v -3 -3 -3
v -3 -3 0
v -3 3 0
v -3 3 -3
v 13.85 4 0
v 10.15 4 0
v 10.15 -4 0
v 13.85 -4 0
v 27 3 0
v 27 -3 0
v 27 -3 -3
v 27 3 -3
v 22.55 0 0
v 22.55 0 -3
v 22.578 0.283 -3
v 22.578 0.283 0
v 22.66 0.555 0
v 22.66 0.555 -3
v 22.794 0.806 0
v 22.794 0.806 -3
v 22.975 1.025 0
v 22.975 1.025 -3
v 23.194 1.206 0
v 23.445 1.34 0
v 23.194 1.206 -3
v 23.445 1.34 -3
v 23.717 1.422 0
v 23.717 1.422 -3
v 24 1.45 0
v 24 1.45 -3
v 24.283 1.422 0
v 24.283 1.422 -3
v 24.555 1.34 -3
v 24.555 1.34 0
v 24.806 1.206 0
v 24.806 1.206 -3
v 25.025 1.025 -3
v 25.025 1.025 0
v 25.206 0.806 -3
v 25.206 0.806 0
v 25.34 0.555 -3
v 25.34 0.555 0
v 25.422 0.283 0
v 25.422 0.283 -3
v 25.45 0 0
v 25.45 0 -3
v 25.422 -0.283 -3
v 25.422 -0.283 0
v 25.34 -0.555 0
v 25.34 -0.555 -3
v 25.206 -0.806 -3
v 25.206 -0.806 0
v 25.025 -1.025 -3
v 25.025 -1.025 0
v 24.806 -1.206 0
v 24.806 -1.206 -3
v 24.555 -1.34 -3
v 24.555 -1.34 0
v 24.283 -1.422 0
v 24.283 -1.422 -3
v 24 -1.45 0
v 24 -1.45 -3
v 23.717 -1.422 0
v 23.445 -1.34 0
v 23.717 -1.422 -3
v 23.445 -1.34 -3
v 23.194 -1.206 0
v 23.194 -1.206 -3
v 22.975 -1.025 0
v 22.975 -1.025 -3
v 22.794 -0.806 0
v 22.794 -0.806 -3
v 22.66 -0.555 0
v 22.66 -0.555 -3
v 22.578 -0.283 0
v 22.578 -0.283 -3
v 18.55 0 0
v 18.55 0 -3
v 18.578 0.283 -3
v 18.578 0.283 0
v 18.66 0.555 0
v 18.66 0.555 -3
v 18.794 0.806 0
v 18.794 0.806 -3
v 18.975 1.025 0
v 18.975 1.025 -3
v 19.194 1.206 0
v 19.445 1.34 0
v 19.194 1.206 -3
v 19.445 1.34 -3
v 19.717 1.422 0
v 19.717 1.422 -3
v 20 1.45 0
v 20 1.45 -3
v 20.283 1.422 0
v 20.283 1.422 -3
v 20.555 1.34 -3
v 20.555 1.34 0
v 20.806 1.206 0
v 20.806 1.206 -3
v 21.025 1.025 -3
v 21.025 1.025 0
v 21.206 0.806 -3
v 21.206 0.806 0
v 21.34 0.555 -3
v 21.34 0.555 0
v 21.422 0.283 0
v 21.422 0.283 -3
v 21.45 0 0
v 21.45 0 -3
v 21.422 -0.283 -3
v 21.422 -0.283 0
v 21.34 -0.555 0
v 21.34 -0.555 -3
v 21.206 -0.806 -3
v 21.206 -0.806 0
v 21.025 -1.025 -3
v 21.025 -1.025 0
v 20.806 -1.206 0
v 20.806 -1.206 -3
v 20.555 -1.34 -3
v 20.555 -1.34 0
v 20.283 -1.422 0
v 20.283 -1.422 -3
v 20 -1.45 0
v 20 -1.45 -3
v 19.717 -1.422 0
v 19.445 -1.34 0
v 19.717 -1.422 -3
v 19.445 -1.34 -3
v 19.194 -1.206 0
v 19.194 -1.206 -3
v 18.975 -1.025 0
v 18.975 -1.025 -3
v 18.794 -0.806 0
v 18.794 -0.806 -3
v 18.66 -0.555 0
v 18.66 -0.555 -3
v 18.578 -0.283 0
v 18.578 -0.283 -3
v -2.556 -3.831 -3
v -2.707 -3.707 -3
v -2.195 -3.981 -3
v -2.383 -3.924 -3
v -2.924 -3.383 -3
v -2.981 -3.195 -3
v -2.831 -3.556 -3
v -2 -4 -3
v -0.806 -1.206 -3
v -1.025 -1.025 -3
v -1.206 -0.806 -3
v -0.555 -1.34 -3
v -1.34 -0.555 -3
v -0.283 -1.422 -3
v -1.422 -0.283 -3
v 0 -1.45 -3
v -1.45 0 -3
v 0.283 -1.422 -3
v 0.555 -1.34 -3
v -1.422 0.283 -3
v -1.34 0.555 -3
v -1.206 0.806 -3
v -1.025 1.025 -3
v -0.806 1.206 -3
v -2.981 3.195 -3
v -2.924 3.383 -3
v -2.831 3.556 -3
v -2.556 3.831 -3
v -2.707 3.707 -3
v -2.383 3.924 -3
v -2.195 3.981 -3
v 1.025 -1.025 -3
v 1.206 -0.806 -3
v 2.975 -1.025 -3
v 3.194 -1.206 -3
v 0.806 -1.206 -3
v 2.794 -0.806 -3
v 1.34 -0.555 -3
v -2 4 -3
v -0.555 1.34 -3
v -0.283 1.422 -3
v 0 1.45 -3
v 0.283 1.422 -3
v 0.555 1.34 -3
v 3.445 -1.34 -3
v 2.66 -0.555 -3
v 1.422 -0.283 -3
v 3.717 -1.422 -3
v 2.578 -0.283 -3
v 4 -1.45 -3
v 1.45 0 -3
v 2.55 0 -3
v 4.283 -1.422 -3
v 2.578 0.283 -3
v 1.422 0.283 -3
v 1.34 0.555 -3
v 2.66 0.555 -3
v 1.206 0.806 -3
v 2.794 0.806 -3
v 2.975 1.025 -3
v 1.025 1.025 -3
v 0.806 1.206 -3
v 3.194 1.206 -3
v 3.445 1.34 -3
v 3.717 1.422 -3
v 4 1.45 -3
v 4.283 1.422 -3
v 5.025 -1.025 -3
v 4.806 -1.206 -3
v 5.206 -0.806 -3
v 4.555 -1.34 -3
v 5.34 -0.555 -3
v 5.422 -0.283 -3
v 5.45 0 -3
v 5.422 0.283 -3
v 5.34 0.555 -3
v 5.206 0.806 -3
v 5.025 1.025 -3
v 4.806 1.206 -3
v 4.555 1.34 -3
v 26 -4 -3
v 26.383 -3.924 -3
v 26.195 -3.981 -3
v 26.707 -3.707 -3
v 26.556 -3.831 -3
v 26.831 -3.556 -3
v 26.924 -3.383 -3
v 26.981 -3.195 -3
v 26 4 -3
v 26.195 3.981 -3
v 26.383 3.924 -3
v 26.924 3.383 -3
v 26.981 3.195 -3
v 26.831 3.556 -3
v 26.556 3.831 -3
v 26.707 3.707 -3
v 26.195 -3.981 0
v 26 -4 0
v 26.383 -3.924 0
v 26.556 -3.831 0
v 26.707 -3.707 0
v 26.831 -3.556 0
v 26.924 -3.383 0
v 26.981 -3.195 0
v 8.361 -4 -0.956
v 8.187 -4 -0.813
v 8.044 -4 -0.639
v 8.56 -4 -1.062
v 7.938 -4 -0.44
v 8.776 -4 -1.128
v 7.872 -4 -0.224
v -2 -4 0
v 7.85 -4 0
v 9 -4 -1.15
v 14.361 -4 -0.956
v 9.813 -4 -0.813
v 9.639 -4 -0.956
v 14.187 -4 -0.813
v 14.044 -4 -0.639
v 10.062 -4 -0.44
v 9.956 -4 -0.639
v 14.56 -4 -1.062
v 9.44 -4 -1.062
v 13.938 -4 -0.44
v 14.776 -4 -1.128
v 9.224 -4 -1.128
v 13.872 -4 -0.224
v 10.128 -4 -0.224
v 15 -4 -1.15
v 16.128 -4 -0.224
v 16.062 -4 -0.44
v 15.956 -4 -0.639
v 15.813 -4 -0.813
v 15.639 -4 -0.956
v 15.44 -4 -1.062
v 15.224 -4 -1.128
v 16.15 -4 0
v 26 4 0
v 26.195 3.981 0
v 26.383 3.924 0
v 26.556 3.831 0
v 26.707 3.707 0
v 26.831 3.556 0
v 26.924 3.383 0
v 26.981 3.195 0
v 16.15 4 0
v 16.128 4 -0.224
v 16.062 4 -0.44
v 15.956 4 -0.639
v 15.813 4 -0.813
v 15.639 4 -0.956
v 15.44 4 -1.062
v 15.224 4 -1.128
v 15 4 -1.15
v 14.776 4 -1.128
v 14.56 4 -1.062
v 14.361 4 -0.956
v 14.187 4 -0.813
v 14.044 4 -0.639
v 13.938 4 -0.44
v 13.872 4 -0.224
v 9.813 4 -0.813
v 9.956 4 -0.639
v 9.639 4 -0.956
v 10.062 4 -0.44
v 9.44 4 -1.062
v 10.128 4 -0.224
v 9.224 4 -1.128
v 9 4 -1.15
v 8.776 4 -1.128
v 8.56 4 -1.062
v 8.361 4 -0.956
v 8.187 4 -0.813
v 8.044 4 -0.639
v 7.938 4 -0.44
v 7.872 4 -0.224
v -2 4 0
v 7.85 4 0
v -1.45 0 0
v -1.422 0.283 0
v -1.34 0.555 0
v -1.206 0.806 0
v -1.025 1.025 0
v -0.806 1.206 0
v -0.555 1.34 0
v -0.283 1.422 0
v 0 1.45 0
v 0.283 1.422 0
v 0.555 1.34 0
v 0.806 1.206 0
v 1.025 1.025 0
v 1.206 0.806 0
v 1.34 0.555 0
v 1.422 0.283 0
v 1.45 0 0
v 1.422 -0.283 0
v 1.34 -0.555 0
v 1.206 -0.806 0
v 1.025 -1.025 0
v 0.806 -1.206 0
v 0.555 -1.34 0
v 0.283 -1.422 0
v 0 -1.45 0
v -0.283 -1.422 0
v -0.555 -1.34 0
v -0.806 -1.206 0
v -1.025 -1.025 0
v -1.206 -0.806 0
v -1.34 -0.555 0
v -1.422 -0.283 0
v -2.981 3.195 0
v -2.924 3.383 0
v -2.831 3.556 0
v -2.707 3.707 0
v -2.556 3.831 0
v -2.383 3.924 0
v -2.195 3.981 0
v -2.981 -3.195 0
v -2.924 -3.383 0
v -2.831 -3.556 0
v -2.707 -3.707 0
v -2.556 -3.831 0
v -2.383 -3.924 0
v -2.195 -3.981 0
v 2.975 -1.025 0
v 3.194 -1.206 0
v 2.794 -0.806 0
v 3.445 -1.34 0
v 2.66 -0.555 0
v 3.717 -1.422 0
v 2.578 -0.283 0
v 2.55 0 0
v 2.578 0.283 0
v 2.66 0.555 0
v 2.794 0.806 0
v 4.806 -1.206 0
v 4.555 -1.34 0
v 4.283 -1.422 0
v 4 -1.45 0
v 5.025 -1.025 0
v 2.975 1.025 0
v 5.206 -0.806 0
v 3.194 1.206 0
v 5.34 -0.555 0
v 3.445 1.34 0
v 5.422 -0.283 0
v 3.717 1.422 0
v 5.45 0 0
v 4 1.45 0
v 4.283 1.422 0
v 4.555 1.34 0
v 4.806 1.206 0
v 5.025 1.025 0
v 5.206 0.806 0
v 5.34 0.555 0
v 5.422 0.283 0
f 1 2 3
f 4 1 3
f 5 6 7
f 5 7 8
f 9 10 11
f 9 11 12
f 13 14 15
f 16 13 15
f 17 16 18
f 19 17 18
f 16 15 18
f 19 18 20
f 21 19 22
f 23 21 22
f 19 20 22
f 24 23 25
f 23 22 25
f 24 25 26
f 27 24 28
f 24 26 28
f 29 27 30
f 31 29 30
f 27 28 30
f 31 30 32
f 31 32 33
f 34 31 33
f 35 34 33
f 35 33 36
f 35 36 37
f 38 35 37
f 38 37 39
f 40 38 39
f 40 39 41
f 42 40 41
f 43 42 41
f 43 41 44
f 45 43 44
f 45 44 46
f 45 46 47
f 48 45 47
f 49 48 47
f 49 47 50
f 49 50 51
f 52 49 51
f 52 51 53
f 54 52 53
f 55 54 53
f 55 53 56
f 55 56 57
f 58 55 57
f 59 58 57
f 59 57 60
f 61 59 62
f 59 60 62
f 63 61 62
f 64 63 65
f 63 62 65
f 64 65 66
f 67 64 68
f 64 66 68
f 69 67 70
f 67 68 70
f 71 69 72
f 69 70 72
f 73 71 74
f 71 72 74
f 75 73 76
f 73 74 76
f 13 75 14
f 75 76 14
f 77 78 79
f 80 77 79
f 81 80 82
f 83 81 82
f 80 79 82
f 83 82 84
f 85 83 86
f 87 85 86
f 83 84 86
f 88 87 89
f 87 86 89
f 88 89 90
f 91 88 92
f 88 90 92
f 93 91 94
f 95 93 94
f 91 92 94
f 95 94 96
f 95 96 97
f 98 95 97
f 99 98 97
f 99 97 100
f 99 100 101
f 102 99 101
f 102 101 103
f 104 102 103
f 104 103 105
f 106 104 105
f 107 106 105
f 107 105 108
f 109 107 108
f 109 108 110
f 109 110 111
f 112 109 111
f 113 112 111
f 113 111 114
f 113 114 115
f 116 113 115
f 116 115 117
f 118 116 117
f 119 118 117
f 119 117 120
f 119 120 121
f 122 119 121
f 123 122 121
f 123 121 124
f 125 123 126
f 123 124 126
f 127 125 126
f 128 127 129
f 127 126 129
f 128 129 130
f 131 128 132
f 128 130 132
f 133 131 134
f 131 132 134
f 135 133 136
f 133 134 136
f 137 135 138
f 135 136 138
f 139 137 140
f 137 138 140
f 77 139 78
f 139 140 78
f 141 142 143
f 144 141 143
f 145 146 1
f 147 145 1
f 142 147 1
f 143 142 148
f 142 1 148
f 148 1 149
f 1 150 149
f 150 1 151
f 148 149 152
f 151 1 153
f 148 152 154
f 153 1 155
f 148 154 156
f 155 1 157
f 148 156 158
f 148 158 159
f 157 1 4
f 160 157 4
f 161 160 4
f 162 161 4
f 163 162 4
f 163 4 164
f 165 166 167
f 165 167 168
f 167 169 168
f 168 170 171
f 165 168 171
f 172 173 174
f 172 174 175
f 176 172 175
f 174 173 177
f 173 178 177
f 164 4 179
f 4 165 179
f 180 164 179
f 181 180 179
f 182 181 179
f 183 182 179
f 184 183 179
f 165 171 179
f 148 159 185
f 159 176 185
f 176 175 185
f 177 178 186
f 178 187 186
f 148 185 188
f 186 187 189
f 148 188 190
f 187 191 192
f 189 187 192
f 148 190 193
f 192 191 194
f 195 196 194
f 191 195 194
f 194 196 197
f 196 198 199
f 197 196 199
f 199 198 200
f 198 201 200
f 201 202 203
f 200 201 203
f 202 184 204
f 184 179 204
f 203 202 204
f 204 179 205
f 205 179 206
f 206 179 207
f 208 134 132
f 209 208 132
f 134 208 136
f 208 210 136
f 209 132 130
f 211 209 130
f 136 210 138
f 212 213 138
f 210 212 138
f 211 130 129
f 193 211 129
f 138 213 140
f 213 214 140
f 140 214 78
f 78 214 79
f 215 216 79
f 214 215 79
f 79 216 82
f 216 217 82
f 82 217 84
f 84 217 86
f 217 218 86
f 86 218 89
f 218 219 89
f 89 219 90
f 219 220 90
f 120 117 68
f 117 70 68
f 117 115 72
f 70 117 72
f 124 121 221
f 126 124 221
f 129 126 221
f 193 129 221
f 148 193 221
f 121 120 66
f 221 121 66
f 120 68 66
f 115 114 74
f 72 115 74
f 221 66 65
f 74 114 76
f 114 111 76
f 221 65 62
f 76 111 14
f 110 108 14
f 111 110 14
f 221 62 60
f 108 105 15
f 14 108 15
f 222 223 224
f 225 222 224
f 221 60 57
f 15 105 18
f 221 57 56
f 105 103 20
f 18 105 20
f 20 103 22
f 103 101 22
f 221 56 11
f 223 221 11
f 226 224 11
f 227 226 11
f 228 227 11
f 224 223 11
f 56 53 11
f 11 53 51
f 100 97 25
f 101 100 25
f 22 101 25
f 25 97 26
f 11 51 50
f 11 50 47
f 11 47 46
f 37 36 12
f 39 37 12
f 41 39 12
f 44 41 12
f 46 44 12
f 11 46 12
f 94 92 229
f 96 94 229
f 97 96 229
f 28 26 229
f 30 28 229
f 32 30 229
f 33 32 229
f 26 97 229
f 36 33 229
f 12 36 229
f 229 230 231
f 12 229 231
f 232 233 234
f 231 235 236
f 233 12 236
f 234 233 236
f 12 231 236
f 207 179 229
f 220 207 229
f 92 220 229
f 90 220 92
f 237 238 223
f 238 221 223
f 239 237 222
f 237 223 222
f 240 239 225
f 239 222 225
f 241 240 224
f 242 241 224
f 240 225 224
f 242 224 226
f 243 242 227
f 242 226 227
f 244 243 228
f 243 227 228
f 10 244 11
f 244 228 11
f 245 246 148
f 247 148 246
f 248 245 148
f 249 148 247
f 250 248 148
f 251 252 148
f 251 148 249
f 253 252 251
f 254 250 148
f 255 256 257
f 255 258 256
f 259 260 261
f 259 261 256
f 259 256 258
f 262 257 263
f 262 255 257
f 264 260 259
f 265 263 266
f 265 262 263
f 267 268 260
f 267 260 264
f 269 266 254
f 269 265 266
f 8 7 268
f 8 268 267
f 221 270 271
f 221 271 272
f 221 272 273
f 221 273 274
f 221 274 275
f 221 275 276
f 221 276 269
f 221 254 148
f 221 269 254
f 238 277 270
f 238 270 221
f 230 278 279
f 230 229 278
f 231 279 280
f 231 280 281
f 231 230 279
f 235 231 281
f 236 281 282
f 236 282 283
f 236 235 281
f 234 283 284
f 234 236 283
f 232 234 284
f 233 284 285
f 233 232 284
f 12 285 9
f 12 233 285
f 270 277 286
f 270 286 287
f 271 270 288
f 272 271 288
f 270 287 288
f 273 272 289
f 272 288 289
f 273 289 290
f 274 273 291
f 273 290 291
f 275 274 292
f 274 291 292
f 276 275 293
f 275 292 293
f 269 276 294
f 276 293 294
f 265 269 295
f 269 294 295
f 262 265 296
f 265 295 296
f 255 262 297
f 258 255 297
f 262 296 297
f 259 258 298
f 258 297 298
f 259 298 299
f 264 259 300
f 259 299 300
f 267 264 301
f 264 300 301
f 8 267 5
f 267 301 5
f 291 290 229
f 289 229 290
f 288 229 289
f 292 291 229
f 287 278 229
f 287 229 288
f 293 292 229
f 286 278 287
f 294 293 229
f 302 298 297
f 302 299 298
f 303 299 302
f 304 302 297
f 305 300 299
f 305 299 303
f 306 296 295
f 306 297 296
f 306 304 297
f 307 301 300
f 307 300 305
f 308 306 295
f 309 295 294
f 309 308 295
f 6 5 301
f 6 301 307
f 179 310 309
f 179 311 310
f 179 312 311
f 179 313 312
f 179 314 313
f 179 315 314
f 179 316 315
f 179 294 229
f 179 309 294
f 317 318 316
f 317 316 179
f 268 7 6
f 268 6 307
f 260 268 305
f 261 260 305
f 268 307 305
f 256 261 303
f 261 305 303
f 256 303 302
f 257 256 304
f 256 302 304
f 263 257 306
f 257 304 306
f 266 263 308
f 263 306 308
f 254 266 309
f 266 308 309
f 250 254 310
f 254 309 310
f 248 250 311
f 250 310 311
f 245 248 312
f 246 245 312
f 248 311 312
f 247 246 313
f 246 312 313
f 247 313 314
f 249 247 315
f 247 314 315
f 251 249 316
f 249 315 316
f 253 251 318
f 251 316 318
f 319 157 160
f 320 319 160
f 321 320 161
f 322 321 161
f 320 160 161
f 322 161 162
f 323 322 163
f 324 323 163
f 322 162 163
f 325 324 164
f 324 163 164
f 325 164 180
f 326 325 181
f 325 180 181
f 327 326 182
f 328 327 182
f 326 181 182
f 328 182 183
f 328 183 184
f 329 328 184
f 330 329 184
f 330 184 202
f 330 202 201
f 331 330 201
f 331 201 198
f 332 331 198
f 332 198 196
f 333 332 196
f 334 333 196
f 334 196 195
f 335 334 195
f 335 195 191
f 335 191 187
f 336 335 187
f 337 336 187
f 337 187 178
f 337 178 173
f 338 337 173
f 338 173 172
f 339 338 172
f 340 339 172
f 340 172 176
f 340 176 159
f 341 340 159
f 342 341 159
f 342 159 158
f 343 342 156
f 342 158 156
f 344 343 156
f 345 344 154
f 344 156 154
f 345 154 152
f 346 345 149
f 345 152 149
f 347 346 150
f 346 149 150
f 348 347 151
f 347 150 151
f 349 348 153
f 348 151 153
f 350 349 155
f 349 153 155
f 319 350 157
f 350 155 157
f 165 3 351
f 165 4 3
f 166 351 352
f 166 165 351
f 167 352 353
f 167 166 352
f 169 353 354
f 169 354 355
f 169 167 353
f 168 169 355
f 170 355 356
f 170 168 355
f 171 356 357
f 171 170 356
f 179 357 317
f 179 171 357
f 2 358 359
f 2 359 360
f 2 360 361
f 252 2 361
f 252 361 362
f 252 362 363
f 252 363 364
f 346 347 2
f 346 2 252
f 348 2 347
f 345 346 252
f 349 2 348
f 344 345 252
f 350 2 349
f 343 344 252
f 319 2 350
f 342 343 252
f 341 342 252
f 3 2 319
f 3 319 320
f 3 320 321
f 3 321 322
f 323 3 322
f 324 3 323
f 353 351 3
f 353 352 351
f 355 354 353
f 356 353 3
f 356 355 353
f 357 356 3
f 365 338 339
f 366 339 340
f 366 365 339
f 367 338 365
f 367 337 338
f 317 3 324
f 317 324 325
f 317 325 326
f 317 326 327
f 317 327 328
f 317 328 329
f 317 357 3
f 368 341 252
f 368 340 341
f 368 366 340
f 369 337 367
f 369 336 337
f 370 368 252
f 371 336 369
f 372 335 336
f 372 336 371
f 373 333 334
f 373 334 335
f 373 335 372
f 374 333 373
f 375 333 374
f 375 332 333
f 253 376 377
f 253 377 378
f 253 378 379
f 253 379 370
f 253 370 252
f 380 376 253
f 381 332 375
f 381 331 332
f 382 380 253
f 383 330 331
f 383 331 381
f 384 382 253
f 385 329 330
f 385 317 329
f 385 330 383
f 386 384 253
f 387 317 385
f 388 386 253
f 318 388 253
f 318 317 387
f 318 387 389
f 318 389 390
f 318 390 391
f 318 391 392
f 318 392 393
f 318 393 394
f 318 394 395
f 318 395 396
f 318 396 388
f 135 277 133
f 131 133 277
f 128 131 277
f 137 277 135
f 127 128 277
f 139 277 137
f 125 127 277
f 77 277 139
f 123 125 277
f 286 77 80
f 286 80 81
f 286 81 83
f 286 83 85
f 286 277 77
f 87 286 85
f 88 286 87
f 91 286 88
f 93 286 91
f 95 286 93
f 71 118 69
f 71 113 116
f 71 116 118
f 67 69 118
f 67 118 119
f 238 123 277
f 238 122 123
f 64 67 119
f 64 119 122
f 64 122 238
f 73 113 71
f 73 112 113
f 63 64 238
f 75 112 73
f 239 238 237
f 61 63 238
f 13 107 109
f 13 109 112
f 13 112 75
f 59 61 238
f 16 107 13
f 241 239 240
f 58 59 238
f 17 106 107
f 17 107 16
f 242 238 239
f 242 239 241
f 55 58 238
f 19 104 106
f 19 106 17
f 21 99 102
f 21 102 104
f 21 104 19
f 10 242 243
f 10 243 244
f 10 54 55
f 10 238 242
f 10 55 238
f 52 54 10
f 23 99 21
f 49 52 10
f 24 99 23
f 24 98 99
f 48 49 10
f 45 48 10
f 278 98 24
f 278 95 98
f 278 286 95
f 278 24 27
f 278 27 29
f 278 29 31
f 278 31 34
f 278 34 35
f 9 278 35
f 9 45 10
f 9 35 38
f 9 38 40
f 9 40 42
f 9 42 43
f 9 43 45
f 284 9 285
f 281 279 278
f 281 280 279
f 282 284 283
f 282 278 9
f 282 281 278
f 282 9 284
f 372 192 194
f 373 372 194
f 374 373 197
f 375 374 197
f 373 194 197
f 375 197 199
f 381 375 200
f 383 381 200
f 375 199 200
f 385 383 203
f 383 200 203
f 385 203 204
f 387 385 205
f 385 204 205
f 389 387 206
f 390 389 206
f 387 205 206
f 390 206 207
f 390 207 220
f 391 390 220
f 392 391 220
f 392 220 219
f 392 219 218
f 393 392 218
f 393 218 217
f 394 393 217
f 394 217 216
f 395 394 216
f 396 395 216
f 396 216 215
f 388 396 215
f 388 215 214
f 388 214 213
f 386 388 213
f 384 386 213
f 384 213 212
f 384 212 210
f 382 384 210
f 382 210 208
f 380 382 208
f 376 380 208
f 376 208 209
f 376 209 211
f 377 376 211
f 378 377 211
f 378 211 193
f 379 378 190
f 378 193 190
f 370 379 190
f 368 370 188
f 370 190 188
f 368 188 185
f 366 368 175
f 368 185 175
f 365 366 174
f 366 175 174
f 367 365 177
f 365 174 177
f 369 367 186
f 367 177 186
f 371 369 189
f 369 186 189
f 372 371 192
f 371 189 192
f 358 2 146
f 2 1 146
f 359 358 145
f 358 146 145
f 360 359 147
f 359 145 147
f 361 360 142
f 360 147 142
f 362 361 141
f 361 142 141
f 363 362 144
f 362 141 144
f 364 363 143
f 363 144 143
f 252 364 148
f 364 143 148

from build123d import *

# Parameters (mm, degrees)
F0_W     = 6
F0_H     = 8
F0_W_2   = 18
F1_DEPTH = 3
F2_D     = 2.9
F4_D     = 2.3
F5_R     = 1


with BuildPart() as f1:
    # F0 (on Top) → F1 (new body)
    with BuildSketch(Plane.XY):
        Rectangle(F0_W, F0_H)
        with Locations((12, 0)):
            Rectangle(F0_W_2, F0_H)
        with Locations((24, 0)):
            Rectangle(F0_W, F0_H)
    extrude(amount=-F1_DEPTH)

    # F2 (through all)
    with Locations(Plane.XY):
        with Locations((0, 0), (4, 0), (20, 0), (24, 0)):
            Hole(F2_D / 2)

    # F4 (through all)
    with Locations(Plane.XZ.offset(4)):
        with Locations((9, 0), (15, 0)):
            Hole(F4_D / 2)

    # F5
    f5_edges = [f1.edges().sort_by_distance(p)[0] for p in [
        (-3, -4, -1.5),
        (27, -4, -1.5),
        (27, 4, -1.5),
        (-3, 4, -1.5),
    ]]
    fillet(f5_edges, radius=F5_R)


solid = f1.part
